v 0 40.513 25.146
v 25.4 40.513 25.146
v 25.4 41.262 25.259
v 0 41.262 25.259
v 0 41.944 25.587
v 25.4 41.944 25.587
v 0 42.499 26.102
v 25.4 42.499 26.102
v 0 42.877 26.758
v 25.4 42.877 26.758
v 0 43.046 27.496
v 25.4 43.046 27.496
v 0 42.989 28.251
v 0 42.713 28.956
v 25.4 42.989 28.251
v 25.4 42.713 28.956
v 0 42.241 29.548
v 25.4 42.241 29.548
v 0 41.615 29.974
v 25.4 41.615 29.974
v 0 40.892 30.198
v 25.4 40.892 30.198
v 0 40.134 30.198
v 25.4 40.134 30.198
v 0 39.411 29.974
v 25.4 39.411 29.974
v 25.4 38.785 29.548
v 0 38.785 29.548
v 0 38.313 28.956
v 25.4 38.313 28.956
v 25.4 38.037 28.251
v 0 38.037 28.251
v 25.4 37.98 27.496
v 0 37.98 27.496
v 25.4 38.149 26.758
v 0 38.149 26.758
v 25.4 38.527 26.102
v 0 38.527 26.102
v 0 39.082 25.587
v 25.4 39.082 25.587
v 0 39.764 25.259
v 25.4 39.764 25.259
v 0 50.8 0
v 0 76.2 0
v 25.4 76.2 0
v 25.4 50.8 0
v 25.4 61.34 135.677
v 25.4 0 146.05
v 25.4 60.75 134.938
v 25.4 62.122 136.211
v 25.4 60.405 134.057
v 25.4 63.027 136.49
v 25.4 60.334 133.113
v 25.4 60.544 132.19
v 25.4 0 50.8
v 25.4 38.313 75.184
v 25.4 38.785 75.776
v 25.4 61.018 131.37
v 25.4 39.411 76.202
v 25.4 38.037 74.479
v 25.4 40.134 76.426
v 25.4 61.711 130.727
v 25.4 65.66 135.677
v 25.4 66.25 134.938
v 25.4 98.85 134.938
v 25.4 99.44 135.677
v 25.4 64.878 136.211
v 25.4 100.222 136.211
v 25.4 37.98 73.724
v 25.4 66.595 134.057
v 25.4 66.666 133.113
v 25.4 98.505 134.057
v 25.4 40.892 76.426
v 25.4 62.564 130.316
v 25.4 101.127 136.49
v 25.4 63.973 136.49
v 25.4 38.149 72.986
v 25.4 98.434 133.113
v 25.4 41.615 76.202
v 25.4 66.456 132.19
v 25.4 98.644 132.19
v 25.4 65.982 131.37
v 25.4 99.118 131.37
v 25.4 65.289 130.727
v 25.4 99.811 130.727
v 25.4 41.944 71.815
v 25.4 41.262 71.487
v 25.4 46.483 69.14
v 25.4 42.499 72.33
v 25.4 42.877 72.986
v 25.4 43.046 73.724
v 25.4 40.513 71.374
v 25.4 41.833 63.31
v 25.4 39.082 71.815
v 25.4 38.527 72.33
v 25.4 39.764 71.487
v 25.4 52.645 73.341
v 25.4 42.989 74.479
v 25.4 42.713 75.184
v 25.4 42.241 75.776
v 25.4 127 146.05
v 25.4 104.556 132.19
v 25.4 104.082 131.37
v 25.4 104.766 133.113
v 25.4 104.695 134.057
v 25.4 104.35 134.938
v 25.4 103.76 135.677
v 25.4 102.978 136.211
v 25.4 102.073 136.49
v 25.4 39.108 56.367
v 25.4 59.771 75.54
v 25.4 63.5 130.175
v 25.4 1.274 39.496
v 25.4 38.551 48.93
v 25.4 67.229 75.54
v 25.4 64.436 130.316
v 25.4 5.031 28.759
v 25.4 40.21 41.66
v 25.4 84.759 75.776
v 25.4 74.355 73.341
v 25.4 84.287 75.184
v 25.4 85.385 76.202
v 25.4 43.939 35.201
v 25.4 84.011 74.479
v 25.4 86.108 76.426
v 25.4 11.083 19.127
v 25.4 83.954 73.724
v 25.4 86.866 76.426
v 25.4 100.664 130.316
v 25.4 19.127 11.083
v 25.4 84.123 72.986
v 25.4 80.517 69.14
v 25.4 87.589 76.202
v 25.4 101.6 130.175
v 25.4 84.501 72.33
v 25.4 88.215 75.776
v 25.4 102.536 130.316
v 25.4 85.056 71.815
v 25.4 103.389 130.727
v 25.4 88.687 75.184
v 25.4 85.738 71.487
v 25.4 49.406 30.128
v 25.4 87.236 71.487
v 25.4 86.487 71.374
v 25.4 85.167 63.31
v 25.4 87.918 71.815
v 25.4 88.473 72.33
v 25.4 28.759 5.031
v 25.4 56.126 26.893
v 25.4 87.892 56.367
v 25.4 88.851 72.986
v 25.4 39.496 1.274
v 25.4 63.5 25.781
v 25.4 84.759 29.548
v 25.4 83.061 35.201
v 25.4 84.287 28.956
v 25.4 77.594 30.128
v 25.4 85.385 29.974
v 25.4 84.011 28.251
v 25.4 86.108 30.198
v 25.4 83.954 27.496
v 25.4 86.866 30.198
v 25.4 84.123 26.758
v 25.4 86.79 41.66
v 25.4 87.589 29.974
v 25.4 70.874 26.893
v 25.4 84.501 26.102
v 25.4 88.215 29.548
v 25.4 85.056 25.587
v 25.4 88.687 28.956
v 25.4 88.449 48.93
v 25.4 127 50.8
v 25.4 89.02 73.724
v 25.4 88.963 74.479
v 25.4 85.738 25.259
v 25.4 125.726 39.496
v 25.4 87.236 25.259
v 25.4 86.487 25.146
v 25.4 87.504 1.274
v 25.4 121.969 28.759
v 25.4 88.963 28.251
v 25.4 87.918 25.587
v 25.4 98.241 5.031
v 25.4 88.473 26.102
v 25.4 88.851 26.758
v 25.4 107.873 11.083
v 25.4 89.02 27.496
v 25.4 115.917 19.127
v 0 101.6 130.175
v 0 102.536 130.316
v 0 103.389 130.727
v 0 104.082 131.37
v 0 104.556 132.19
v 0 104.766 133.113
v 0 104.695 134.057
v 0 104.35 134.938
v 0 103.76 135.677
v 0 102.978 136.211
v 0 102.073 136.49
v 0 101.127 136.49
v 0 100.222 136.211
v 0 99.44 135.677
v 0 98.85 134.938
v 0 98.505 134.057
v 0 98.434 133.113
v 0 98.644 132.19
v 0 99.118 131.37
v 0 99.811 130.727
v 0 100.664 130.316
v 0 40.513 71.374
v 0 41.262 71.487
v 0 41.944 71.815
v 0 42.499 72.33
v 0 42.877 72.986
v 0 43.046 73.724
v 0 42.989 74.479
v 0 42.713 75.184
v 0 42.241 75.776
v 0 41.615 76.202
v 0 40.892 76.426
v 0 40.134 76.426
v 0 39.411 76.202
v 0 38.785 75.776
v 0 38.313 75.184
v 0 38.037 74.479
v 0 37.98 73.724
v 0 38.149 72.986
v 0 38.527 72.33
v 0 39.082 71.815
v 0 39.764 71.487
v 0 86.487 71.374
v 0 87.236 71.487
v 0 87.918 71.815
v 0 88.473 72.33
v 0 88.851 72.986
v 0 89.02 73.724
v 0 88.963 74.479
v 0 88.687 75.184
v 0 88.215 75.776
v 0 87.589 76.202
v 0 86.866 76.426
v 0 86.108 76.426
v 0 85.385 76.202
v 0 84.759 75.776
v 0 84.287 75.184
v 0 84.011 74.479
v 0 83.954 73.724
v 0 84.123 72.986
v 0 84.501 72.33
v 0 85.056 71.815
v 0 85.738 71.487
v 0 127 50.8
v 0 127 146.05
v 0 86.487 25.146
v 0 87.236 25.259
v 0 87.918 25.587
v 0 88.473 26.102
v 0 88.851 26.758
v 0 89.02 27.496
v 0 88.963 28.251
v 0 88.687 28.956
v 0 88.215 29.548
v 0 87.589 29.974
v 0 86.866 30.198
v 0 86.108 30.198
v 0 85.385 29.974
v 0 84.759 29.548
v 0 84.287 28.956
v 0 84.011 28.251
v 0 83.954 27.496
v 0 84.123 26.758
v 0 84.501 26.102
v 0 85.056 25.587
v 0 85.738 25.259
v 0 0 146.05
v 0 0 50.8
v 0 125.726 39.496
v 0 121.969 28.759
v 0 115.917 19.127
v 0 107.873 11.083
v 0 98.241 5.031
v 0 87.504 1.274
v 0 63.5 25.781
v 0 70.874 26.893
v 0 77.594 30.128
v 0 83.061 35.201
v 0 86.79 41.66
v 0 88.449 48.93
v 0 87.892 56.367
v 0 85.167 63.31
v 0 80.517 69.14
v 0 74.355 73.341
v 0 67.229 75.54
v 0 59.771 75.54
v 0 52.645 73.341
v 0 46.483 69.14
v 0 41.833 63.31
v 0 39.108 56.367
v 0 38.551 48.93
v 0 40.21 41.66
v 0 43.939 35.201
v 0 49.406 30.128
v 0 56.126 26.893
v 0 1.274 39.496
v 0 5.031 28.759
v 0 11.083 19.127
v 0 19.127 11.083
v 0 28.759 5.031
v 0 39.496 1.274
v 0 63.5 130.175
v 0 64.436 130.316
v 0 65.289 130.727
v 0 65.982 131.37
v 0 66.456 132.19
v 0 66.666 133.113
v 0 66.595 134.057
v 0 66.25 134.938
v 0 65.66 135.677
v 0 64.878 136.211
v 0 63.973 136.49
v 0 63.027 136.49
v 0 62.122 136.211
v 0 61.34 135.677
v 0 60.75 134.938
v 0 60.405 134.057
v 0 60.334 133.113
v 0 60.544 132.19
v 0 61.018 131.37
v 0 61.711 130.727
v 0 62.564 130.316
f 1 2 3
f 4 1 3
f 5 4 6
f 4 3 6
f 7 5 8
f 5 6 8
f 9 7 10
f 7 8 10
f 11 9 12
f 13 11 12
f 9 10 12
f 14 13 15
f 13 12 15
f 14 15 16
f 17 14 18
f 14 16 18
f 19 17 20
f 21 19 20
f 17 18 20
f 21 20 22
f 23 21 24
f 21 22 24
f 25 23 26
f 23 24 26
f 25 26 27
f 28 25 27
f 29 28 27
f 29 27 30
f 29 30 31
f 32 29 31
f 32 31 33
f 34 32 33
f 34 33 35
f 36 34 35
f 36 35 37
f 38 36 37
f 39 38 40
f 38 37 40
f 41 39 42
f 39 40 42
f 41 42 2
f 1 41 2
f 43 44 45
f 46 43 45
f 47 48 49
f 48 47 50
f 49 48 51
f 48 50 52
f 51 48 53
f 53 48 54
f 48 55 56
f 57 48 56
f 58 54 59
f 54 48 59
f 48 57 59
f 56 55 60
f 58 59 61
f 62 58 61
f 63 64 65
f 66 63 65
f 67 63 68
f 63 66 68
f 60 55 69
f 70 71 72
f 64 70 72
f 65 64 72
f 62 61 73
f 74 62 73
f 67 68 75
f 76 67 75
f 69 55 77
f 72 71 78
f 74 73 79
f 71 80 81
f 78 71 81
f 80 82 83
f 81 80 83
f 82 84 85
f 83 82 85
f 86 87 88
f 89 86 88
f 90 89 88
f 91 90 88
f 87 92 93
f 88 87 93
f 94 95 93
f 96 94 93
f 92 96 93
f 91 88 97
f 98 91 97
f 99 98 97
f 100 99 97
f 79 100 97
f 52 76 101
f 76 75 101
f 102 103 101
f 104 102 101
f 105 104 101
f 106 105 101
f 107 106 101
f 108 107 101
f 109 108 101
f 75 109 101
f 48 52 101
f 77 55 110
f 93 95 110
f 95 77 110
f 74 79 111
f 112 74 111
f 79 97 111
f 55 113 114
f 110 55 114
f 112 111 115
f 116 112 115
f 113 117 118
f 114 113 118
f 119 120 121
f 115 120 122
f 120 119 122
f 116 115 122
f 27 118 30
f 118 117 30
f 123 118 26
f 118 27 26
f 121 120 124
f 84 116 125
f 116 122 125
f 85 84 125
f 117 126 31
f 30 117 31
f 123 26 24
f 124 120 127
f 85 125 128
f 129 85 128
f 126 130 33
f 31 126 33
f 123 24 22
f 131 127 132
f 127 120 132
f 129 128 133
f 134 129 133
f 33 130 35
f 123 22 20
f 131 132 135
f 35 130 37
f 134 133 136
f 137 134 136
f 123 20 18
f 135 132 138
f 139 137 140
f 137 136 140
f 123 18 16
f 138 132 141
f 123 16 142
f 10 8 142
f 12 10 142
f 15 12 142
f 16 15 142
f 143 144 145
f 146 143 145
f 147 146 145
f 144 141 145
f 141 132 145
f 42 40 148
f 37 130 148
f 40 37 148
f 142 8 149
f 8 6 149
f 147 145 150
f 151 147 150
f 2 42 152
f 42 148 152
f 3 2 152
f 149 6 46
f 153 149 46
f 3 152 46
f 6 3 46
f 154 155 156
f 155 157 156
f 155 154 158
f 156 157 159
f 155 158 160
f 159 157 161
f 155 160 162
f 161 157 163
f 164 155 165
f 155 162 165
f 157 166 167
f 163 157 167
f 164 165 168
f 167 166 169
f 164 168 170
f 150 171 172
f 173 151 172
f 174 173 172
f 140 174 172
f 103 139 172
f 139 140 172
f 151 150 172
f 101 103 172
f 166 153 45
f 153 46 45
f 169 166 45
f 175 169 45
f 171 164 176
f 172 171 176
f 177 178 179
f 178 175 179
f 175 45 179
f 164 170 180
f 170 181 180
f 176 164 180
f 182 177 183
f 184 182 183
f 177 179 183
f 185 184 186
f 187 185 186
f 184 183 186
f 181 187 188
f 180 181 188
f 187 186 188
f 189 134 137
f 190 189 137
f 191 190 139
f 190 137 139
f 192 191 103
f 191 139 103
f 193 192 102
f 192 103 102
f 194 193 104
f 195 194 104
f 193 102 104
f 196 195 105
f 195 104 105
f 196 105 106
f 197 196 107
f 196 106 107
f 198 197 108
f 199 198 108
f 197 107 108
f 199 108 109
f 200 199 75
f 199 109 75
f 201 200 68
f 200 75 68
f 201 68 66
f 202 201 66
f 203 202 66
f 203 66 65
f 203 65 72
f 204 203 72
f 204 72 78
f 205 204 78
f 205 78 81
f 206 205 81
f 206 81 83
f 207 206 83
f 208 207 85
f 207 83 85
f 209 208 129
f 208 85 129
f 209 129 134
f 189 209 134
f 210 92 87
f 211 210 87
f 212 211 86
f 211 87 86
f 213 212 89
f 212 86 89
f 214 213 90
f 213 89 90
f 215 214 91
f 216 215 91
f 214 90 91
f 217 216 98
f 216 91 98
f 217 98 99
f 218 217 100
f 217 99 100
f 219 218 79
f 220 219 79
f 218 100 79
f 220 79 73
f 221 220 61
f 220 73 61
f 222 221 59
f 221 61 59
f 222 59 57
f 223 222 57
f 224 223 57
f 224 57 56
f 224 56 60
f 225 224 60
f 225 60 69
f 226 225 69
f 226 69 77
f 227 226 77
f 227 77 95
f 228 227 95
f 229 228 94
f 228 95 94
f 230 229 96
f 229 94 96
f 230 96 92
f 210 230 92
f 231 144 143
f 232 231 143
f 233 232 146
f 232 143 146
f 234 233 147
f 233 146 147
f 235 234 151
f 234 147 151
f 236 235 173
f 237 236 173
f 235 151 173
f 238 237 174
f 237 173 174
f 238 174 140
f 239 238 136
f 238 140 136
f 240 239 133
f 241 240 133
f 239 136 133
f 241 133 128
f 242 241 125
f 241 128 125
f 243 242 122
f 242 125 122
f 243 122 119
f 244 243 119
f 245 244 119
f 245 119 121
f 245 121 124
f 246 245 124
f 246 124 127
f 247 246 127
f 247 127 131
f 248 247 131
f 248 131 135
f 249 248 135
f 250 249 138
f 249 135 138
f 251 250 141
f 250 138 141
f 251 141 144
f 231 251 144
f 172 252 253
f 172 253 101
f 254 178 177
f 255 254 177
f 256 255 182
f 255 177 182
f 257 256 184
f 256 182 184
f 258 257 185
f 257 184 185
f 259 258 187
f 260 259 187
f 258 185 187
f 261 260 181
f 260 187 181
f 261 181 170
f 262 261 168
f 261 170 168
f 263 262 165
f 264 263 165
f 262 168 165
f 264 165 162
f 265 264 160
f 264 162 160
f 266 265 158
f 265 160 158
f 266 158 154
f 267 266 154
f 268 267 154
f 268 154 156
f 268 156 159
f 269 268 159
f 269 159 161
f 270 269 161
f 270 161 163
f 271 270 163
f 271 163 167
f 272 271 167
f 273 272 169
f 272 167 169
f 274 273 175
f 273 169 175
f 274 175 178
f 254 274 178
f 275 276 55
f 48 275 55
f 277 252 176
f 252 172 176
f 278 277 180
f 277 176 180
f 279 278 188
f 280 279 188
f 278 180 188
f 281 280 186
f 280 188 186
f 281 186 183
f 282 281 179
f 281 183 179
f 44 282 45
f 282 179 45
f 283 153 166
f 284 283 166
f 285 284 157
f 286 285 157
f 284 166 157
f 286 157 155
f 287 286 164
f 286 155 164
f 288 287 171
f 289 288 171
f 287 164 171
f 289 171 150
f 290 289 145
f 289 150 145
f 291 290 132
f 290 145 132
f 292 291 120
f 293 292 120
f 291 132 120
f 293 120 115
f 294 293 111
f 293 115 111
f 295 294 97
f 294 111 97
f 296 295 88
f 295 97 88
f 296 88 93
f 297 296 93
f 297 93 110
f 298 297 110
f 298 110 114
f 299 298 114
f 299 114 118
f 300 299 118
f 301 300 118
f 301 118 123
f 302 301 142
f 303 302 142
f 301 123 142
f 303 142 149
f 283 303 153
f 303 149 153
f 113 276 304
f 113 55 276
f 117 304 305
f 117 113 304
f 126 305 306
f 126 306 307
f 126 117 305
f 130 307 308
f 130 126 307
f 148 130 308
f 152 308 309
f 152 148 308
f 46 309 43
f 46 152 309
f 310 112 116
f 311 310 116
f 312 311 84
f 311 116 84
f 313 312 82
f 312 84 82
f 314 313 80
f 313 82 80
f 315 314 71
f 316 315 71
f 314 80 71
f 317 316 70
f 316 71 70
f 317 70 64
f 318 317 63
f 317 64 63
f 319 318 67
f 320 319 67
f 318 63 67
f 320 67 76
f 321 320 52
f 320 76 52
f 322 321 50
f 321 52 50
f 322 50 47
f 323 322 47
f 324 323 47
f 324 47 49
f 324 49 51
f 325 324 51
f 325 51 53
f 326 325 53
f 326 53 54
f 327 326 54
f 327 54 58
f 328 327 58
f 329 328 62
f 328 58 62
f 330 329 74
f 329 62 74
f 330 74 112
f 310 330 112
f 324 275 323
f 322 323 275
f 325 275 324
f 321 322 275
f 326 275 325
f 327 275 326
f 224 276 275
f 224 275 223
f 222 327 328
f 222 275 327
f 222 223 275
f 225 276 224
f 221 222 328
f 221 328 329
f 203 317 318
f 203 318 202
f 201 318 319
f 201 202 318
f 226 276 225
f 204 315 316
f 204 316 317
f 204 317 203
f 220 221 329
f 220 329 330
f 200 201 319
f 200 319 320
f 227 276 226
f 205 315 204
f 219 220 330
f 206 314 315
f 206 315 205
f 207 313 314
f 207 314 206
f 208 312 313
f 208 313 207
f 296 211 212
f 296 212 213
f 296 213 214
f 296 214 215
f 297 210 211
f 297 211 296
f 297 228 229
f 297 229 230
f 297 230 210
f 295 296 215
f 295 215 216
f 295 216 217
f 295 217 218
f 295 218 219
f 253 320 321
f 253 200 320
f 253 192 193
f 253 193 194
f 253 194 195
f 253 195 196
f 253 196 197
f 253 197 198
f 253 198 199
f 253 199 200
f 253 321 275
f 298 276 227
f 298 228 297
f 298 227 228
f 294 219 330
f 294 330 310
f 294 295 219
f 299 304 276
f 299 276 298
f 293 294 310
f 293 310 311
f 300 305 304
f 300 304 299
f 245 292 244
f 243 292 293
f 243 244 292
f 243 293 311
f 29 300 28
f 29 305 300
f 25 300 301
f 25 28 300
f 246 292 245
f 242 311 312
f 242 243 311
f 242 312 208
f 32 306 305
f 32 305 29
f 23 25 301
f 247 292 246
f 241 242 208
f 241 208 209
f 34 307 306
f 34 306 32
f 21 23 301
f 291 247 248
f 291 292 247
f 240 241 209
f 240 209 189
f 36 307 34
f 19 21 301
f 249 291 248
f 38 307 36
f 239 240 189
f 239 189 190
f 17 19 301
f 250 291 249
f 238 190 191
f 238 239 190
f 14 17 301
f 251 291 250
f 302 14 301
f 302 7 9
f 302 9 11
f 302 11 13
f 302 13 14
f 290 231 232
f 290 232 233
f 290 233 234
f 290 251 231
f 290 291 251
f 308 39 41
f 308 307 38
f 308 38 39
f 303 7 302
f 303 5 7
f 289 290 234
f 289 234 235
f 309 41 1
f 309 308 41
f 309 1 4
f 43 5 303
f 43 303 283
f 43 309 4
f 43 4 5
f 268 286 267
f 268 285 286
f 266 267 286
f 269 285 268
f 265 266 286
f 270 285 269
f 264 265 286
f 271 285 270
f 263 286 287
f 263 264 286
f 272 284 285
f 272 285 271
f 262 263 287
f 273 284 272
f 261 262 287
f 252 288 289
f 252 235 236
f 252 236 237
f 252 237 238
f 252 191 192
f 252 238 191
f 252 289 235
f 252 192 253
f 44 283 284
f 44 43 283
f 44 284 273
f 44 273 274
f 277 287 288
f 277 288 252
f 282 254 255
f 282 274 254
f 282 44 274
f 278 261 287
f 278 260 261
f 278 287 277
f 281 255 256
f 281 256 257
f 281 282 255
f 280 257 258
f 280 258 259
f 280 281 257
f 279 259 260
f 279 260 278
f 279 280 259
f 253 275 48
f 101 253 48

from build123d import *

# Parameters (mm, degrees)
SKETCH1_W           = 25.4
SKETCH1_H           = 127
BOSS_EXTRUDE1_DEPTH = 146.05
FILLET1_R           = 50.8
SKETCH3_R           = 3.175
SKETCH3_R_2         = 25.019
SKETCH3_R_3         = 2.54
CUT_EXTRUDE1_DEPTH  = 25.4


with BuildPart() as part:
    # Sketch1 → Boss-Extrude1 (new body)
    with BuildSketch(Plane.XY):
        with Locations((12.7, 63.5)):
            Rectangle(SKETCH1_W, SKETCH1_H)
    extrude(amount=BOSS_EXTRUDE1_DEPTH)

    # Fillet1
    fillet1_edges = [part.edges().sort_by_distance(p)[0] for p in [
        (12.7, 127, 0),
        (12.7, 0, 0),
    ]]
    fillet(fillet1_edges, radius=FILLET1_R)

    # Sketch3 → Cut-Extrude1 (cut)
    with BuildSketch(Plane(origin=(25.4, 0, 0), x_dir=(0, 0, -1), z_dir=(1, 0, 0))):
        with Locations((-133.35, 63.5)):
            Circle(SKETCH3_R)
        with Locations((-133.35, 101.6)):
            Circle(SKETCH3_R)
        with Locations((-50.8, 63.5)):
            Circle(SKETCH3_R_2)
        with Locations((-73.914, 86.487)):
            Circle(SKETCH3_R_3)
        with Locations((-27.686, 86.487)):
            Circle(SKETCH3_R_3)
        with Locations((-27.686, 40.513)):
            Circle(SKETCH3_R_3)
        with Locations((-73.914, 40.513)):
            Circle(SKETCH3_R_3)
    extrude(amount=-CUT_EXTRUDE1_DEPTH, mode=Mode.SUBTRACT)


solid = part.part
